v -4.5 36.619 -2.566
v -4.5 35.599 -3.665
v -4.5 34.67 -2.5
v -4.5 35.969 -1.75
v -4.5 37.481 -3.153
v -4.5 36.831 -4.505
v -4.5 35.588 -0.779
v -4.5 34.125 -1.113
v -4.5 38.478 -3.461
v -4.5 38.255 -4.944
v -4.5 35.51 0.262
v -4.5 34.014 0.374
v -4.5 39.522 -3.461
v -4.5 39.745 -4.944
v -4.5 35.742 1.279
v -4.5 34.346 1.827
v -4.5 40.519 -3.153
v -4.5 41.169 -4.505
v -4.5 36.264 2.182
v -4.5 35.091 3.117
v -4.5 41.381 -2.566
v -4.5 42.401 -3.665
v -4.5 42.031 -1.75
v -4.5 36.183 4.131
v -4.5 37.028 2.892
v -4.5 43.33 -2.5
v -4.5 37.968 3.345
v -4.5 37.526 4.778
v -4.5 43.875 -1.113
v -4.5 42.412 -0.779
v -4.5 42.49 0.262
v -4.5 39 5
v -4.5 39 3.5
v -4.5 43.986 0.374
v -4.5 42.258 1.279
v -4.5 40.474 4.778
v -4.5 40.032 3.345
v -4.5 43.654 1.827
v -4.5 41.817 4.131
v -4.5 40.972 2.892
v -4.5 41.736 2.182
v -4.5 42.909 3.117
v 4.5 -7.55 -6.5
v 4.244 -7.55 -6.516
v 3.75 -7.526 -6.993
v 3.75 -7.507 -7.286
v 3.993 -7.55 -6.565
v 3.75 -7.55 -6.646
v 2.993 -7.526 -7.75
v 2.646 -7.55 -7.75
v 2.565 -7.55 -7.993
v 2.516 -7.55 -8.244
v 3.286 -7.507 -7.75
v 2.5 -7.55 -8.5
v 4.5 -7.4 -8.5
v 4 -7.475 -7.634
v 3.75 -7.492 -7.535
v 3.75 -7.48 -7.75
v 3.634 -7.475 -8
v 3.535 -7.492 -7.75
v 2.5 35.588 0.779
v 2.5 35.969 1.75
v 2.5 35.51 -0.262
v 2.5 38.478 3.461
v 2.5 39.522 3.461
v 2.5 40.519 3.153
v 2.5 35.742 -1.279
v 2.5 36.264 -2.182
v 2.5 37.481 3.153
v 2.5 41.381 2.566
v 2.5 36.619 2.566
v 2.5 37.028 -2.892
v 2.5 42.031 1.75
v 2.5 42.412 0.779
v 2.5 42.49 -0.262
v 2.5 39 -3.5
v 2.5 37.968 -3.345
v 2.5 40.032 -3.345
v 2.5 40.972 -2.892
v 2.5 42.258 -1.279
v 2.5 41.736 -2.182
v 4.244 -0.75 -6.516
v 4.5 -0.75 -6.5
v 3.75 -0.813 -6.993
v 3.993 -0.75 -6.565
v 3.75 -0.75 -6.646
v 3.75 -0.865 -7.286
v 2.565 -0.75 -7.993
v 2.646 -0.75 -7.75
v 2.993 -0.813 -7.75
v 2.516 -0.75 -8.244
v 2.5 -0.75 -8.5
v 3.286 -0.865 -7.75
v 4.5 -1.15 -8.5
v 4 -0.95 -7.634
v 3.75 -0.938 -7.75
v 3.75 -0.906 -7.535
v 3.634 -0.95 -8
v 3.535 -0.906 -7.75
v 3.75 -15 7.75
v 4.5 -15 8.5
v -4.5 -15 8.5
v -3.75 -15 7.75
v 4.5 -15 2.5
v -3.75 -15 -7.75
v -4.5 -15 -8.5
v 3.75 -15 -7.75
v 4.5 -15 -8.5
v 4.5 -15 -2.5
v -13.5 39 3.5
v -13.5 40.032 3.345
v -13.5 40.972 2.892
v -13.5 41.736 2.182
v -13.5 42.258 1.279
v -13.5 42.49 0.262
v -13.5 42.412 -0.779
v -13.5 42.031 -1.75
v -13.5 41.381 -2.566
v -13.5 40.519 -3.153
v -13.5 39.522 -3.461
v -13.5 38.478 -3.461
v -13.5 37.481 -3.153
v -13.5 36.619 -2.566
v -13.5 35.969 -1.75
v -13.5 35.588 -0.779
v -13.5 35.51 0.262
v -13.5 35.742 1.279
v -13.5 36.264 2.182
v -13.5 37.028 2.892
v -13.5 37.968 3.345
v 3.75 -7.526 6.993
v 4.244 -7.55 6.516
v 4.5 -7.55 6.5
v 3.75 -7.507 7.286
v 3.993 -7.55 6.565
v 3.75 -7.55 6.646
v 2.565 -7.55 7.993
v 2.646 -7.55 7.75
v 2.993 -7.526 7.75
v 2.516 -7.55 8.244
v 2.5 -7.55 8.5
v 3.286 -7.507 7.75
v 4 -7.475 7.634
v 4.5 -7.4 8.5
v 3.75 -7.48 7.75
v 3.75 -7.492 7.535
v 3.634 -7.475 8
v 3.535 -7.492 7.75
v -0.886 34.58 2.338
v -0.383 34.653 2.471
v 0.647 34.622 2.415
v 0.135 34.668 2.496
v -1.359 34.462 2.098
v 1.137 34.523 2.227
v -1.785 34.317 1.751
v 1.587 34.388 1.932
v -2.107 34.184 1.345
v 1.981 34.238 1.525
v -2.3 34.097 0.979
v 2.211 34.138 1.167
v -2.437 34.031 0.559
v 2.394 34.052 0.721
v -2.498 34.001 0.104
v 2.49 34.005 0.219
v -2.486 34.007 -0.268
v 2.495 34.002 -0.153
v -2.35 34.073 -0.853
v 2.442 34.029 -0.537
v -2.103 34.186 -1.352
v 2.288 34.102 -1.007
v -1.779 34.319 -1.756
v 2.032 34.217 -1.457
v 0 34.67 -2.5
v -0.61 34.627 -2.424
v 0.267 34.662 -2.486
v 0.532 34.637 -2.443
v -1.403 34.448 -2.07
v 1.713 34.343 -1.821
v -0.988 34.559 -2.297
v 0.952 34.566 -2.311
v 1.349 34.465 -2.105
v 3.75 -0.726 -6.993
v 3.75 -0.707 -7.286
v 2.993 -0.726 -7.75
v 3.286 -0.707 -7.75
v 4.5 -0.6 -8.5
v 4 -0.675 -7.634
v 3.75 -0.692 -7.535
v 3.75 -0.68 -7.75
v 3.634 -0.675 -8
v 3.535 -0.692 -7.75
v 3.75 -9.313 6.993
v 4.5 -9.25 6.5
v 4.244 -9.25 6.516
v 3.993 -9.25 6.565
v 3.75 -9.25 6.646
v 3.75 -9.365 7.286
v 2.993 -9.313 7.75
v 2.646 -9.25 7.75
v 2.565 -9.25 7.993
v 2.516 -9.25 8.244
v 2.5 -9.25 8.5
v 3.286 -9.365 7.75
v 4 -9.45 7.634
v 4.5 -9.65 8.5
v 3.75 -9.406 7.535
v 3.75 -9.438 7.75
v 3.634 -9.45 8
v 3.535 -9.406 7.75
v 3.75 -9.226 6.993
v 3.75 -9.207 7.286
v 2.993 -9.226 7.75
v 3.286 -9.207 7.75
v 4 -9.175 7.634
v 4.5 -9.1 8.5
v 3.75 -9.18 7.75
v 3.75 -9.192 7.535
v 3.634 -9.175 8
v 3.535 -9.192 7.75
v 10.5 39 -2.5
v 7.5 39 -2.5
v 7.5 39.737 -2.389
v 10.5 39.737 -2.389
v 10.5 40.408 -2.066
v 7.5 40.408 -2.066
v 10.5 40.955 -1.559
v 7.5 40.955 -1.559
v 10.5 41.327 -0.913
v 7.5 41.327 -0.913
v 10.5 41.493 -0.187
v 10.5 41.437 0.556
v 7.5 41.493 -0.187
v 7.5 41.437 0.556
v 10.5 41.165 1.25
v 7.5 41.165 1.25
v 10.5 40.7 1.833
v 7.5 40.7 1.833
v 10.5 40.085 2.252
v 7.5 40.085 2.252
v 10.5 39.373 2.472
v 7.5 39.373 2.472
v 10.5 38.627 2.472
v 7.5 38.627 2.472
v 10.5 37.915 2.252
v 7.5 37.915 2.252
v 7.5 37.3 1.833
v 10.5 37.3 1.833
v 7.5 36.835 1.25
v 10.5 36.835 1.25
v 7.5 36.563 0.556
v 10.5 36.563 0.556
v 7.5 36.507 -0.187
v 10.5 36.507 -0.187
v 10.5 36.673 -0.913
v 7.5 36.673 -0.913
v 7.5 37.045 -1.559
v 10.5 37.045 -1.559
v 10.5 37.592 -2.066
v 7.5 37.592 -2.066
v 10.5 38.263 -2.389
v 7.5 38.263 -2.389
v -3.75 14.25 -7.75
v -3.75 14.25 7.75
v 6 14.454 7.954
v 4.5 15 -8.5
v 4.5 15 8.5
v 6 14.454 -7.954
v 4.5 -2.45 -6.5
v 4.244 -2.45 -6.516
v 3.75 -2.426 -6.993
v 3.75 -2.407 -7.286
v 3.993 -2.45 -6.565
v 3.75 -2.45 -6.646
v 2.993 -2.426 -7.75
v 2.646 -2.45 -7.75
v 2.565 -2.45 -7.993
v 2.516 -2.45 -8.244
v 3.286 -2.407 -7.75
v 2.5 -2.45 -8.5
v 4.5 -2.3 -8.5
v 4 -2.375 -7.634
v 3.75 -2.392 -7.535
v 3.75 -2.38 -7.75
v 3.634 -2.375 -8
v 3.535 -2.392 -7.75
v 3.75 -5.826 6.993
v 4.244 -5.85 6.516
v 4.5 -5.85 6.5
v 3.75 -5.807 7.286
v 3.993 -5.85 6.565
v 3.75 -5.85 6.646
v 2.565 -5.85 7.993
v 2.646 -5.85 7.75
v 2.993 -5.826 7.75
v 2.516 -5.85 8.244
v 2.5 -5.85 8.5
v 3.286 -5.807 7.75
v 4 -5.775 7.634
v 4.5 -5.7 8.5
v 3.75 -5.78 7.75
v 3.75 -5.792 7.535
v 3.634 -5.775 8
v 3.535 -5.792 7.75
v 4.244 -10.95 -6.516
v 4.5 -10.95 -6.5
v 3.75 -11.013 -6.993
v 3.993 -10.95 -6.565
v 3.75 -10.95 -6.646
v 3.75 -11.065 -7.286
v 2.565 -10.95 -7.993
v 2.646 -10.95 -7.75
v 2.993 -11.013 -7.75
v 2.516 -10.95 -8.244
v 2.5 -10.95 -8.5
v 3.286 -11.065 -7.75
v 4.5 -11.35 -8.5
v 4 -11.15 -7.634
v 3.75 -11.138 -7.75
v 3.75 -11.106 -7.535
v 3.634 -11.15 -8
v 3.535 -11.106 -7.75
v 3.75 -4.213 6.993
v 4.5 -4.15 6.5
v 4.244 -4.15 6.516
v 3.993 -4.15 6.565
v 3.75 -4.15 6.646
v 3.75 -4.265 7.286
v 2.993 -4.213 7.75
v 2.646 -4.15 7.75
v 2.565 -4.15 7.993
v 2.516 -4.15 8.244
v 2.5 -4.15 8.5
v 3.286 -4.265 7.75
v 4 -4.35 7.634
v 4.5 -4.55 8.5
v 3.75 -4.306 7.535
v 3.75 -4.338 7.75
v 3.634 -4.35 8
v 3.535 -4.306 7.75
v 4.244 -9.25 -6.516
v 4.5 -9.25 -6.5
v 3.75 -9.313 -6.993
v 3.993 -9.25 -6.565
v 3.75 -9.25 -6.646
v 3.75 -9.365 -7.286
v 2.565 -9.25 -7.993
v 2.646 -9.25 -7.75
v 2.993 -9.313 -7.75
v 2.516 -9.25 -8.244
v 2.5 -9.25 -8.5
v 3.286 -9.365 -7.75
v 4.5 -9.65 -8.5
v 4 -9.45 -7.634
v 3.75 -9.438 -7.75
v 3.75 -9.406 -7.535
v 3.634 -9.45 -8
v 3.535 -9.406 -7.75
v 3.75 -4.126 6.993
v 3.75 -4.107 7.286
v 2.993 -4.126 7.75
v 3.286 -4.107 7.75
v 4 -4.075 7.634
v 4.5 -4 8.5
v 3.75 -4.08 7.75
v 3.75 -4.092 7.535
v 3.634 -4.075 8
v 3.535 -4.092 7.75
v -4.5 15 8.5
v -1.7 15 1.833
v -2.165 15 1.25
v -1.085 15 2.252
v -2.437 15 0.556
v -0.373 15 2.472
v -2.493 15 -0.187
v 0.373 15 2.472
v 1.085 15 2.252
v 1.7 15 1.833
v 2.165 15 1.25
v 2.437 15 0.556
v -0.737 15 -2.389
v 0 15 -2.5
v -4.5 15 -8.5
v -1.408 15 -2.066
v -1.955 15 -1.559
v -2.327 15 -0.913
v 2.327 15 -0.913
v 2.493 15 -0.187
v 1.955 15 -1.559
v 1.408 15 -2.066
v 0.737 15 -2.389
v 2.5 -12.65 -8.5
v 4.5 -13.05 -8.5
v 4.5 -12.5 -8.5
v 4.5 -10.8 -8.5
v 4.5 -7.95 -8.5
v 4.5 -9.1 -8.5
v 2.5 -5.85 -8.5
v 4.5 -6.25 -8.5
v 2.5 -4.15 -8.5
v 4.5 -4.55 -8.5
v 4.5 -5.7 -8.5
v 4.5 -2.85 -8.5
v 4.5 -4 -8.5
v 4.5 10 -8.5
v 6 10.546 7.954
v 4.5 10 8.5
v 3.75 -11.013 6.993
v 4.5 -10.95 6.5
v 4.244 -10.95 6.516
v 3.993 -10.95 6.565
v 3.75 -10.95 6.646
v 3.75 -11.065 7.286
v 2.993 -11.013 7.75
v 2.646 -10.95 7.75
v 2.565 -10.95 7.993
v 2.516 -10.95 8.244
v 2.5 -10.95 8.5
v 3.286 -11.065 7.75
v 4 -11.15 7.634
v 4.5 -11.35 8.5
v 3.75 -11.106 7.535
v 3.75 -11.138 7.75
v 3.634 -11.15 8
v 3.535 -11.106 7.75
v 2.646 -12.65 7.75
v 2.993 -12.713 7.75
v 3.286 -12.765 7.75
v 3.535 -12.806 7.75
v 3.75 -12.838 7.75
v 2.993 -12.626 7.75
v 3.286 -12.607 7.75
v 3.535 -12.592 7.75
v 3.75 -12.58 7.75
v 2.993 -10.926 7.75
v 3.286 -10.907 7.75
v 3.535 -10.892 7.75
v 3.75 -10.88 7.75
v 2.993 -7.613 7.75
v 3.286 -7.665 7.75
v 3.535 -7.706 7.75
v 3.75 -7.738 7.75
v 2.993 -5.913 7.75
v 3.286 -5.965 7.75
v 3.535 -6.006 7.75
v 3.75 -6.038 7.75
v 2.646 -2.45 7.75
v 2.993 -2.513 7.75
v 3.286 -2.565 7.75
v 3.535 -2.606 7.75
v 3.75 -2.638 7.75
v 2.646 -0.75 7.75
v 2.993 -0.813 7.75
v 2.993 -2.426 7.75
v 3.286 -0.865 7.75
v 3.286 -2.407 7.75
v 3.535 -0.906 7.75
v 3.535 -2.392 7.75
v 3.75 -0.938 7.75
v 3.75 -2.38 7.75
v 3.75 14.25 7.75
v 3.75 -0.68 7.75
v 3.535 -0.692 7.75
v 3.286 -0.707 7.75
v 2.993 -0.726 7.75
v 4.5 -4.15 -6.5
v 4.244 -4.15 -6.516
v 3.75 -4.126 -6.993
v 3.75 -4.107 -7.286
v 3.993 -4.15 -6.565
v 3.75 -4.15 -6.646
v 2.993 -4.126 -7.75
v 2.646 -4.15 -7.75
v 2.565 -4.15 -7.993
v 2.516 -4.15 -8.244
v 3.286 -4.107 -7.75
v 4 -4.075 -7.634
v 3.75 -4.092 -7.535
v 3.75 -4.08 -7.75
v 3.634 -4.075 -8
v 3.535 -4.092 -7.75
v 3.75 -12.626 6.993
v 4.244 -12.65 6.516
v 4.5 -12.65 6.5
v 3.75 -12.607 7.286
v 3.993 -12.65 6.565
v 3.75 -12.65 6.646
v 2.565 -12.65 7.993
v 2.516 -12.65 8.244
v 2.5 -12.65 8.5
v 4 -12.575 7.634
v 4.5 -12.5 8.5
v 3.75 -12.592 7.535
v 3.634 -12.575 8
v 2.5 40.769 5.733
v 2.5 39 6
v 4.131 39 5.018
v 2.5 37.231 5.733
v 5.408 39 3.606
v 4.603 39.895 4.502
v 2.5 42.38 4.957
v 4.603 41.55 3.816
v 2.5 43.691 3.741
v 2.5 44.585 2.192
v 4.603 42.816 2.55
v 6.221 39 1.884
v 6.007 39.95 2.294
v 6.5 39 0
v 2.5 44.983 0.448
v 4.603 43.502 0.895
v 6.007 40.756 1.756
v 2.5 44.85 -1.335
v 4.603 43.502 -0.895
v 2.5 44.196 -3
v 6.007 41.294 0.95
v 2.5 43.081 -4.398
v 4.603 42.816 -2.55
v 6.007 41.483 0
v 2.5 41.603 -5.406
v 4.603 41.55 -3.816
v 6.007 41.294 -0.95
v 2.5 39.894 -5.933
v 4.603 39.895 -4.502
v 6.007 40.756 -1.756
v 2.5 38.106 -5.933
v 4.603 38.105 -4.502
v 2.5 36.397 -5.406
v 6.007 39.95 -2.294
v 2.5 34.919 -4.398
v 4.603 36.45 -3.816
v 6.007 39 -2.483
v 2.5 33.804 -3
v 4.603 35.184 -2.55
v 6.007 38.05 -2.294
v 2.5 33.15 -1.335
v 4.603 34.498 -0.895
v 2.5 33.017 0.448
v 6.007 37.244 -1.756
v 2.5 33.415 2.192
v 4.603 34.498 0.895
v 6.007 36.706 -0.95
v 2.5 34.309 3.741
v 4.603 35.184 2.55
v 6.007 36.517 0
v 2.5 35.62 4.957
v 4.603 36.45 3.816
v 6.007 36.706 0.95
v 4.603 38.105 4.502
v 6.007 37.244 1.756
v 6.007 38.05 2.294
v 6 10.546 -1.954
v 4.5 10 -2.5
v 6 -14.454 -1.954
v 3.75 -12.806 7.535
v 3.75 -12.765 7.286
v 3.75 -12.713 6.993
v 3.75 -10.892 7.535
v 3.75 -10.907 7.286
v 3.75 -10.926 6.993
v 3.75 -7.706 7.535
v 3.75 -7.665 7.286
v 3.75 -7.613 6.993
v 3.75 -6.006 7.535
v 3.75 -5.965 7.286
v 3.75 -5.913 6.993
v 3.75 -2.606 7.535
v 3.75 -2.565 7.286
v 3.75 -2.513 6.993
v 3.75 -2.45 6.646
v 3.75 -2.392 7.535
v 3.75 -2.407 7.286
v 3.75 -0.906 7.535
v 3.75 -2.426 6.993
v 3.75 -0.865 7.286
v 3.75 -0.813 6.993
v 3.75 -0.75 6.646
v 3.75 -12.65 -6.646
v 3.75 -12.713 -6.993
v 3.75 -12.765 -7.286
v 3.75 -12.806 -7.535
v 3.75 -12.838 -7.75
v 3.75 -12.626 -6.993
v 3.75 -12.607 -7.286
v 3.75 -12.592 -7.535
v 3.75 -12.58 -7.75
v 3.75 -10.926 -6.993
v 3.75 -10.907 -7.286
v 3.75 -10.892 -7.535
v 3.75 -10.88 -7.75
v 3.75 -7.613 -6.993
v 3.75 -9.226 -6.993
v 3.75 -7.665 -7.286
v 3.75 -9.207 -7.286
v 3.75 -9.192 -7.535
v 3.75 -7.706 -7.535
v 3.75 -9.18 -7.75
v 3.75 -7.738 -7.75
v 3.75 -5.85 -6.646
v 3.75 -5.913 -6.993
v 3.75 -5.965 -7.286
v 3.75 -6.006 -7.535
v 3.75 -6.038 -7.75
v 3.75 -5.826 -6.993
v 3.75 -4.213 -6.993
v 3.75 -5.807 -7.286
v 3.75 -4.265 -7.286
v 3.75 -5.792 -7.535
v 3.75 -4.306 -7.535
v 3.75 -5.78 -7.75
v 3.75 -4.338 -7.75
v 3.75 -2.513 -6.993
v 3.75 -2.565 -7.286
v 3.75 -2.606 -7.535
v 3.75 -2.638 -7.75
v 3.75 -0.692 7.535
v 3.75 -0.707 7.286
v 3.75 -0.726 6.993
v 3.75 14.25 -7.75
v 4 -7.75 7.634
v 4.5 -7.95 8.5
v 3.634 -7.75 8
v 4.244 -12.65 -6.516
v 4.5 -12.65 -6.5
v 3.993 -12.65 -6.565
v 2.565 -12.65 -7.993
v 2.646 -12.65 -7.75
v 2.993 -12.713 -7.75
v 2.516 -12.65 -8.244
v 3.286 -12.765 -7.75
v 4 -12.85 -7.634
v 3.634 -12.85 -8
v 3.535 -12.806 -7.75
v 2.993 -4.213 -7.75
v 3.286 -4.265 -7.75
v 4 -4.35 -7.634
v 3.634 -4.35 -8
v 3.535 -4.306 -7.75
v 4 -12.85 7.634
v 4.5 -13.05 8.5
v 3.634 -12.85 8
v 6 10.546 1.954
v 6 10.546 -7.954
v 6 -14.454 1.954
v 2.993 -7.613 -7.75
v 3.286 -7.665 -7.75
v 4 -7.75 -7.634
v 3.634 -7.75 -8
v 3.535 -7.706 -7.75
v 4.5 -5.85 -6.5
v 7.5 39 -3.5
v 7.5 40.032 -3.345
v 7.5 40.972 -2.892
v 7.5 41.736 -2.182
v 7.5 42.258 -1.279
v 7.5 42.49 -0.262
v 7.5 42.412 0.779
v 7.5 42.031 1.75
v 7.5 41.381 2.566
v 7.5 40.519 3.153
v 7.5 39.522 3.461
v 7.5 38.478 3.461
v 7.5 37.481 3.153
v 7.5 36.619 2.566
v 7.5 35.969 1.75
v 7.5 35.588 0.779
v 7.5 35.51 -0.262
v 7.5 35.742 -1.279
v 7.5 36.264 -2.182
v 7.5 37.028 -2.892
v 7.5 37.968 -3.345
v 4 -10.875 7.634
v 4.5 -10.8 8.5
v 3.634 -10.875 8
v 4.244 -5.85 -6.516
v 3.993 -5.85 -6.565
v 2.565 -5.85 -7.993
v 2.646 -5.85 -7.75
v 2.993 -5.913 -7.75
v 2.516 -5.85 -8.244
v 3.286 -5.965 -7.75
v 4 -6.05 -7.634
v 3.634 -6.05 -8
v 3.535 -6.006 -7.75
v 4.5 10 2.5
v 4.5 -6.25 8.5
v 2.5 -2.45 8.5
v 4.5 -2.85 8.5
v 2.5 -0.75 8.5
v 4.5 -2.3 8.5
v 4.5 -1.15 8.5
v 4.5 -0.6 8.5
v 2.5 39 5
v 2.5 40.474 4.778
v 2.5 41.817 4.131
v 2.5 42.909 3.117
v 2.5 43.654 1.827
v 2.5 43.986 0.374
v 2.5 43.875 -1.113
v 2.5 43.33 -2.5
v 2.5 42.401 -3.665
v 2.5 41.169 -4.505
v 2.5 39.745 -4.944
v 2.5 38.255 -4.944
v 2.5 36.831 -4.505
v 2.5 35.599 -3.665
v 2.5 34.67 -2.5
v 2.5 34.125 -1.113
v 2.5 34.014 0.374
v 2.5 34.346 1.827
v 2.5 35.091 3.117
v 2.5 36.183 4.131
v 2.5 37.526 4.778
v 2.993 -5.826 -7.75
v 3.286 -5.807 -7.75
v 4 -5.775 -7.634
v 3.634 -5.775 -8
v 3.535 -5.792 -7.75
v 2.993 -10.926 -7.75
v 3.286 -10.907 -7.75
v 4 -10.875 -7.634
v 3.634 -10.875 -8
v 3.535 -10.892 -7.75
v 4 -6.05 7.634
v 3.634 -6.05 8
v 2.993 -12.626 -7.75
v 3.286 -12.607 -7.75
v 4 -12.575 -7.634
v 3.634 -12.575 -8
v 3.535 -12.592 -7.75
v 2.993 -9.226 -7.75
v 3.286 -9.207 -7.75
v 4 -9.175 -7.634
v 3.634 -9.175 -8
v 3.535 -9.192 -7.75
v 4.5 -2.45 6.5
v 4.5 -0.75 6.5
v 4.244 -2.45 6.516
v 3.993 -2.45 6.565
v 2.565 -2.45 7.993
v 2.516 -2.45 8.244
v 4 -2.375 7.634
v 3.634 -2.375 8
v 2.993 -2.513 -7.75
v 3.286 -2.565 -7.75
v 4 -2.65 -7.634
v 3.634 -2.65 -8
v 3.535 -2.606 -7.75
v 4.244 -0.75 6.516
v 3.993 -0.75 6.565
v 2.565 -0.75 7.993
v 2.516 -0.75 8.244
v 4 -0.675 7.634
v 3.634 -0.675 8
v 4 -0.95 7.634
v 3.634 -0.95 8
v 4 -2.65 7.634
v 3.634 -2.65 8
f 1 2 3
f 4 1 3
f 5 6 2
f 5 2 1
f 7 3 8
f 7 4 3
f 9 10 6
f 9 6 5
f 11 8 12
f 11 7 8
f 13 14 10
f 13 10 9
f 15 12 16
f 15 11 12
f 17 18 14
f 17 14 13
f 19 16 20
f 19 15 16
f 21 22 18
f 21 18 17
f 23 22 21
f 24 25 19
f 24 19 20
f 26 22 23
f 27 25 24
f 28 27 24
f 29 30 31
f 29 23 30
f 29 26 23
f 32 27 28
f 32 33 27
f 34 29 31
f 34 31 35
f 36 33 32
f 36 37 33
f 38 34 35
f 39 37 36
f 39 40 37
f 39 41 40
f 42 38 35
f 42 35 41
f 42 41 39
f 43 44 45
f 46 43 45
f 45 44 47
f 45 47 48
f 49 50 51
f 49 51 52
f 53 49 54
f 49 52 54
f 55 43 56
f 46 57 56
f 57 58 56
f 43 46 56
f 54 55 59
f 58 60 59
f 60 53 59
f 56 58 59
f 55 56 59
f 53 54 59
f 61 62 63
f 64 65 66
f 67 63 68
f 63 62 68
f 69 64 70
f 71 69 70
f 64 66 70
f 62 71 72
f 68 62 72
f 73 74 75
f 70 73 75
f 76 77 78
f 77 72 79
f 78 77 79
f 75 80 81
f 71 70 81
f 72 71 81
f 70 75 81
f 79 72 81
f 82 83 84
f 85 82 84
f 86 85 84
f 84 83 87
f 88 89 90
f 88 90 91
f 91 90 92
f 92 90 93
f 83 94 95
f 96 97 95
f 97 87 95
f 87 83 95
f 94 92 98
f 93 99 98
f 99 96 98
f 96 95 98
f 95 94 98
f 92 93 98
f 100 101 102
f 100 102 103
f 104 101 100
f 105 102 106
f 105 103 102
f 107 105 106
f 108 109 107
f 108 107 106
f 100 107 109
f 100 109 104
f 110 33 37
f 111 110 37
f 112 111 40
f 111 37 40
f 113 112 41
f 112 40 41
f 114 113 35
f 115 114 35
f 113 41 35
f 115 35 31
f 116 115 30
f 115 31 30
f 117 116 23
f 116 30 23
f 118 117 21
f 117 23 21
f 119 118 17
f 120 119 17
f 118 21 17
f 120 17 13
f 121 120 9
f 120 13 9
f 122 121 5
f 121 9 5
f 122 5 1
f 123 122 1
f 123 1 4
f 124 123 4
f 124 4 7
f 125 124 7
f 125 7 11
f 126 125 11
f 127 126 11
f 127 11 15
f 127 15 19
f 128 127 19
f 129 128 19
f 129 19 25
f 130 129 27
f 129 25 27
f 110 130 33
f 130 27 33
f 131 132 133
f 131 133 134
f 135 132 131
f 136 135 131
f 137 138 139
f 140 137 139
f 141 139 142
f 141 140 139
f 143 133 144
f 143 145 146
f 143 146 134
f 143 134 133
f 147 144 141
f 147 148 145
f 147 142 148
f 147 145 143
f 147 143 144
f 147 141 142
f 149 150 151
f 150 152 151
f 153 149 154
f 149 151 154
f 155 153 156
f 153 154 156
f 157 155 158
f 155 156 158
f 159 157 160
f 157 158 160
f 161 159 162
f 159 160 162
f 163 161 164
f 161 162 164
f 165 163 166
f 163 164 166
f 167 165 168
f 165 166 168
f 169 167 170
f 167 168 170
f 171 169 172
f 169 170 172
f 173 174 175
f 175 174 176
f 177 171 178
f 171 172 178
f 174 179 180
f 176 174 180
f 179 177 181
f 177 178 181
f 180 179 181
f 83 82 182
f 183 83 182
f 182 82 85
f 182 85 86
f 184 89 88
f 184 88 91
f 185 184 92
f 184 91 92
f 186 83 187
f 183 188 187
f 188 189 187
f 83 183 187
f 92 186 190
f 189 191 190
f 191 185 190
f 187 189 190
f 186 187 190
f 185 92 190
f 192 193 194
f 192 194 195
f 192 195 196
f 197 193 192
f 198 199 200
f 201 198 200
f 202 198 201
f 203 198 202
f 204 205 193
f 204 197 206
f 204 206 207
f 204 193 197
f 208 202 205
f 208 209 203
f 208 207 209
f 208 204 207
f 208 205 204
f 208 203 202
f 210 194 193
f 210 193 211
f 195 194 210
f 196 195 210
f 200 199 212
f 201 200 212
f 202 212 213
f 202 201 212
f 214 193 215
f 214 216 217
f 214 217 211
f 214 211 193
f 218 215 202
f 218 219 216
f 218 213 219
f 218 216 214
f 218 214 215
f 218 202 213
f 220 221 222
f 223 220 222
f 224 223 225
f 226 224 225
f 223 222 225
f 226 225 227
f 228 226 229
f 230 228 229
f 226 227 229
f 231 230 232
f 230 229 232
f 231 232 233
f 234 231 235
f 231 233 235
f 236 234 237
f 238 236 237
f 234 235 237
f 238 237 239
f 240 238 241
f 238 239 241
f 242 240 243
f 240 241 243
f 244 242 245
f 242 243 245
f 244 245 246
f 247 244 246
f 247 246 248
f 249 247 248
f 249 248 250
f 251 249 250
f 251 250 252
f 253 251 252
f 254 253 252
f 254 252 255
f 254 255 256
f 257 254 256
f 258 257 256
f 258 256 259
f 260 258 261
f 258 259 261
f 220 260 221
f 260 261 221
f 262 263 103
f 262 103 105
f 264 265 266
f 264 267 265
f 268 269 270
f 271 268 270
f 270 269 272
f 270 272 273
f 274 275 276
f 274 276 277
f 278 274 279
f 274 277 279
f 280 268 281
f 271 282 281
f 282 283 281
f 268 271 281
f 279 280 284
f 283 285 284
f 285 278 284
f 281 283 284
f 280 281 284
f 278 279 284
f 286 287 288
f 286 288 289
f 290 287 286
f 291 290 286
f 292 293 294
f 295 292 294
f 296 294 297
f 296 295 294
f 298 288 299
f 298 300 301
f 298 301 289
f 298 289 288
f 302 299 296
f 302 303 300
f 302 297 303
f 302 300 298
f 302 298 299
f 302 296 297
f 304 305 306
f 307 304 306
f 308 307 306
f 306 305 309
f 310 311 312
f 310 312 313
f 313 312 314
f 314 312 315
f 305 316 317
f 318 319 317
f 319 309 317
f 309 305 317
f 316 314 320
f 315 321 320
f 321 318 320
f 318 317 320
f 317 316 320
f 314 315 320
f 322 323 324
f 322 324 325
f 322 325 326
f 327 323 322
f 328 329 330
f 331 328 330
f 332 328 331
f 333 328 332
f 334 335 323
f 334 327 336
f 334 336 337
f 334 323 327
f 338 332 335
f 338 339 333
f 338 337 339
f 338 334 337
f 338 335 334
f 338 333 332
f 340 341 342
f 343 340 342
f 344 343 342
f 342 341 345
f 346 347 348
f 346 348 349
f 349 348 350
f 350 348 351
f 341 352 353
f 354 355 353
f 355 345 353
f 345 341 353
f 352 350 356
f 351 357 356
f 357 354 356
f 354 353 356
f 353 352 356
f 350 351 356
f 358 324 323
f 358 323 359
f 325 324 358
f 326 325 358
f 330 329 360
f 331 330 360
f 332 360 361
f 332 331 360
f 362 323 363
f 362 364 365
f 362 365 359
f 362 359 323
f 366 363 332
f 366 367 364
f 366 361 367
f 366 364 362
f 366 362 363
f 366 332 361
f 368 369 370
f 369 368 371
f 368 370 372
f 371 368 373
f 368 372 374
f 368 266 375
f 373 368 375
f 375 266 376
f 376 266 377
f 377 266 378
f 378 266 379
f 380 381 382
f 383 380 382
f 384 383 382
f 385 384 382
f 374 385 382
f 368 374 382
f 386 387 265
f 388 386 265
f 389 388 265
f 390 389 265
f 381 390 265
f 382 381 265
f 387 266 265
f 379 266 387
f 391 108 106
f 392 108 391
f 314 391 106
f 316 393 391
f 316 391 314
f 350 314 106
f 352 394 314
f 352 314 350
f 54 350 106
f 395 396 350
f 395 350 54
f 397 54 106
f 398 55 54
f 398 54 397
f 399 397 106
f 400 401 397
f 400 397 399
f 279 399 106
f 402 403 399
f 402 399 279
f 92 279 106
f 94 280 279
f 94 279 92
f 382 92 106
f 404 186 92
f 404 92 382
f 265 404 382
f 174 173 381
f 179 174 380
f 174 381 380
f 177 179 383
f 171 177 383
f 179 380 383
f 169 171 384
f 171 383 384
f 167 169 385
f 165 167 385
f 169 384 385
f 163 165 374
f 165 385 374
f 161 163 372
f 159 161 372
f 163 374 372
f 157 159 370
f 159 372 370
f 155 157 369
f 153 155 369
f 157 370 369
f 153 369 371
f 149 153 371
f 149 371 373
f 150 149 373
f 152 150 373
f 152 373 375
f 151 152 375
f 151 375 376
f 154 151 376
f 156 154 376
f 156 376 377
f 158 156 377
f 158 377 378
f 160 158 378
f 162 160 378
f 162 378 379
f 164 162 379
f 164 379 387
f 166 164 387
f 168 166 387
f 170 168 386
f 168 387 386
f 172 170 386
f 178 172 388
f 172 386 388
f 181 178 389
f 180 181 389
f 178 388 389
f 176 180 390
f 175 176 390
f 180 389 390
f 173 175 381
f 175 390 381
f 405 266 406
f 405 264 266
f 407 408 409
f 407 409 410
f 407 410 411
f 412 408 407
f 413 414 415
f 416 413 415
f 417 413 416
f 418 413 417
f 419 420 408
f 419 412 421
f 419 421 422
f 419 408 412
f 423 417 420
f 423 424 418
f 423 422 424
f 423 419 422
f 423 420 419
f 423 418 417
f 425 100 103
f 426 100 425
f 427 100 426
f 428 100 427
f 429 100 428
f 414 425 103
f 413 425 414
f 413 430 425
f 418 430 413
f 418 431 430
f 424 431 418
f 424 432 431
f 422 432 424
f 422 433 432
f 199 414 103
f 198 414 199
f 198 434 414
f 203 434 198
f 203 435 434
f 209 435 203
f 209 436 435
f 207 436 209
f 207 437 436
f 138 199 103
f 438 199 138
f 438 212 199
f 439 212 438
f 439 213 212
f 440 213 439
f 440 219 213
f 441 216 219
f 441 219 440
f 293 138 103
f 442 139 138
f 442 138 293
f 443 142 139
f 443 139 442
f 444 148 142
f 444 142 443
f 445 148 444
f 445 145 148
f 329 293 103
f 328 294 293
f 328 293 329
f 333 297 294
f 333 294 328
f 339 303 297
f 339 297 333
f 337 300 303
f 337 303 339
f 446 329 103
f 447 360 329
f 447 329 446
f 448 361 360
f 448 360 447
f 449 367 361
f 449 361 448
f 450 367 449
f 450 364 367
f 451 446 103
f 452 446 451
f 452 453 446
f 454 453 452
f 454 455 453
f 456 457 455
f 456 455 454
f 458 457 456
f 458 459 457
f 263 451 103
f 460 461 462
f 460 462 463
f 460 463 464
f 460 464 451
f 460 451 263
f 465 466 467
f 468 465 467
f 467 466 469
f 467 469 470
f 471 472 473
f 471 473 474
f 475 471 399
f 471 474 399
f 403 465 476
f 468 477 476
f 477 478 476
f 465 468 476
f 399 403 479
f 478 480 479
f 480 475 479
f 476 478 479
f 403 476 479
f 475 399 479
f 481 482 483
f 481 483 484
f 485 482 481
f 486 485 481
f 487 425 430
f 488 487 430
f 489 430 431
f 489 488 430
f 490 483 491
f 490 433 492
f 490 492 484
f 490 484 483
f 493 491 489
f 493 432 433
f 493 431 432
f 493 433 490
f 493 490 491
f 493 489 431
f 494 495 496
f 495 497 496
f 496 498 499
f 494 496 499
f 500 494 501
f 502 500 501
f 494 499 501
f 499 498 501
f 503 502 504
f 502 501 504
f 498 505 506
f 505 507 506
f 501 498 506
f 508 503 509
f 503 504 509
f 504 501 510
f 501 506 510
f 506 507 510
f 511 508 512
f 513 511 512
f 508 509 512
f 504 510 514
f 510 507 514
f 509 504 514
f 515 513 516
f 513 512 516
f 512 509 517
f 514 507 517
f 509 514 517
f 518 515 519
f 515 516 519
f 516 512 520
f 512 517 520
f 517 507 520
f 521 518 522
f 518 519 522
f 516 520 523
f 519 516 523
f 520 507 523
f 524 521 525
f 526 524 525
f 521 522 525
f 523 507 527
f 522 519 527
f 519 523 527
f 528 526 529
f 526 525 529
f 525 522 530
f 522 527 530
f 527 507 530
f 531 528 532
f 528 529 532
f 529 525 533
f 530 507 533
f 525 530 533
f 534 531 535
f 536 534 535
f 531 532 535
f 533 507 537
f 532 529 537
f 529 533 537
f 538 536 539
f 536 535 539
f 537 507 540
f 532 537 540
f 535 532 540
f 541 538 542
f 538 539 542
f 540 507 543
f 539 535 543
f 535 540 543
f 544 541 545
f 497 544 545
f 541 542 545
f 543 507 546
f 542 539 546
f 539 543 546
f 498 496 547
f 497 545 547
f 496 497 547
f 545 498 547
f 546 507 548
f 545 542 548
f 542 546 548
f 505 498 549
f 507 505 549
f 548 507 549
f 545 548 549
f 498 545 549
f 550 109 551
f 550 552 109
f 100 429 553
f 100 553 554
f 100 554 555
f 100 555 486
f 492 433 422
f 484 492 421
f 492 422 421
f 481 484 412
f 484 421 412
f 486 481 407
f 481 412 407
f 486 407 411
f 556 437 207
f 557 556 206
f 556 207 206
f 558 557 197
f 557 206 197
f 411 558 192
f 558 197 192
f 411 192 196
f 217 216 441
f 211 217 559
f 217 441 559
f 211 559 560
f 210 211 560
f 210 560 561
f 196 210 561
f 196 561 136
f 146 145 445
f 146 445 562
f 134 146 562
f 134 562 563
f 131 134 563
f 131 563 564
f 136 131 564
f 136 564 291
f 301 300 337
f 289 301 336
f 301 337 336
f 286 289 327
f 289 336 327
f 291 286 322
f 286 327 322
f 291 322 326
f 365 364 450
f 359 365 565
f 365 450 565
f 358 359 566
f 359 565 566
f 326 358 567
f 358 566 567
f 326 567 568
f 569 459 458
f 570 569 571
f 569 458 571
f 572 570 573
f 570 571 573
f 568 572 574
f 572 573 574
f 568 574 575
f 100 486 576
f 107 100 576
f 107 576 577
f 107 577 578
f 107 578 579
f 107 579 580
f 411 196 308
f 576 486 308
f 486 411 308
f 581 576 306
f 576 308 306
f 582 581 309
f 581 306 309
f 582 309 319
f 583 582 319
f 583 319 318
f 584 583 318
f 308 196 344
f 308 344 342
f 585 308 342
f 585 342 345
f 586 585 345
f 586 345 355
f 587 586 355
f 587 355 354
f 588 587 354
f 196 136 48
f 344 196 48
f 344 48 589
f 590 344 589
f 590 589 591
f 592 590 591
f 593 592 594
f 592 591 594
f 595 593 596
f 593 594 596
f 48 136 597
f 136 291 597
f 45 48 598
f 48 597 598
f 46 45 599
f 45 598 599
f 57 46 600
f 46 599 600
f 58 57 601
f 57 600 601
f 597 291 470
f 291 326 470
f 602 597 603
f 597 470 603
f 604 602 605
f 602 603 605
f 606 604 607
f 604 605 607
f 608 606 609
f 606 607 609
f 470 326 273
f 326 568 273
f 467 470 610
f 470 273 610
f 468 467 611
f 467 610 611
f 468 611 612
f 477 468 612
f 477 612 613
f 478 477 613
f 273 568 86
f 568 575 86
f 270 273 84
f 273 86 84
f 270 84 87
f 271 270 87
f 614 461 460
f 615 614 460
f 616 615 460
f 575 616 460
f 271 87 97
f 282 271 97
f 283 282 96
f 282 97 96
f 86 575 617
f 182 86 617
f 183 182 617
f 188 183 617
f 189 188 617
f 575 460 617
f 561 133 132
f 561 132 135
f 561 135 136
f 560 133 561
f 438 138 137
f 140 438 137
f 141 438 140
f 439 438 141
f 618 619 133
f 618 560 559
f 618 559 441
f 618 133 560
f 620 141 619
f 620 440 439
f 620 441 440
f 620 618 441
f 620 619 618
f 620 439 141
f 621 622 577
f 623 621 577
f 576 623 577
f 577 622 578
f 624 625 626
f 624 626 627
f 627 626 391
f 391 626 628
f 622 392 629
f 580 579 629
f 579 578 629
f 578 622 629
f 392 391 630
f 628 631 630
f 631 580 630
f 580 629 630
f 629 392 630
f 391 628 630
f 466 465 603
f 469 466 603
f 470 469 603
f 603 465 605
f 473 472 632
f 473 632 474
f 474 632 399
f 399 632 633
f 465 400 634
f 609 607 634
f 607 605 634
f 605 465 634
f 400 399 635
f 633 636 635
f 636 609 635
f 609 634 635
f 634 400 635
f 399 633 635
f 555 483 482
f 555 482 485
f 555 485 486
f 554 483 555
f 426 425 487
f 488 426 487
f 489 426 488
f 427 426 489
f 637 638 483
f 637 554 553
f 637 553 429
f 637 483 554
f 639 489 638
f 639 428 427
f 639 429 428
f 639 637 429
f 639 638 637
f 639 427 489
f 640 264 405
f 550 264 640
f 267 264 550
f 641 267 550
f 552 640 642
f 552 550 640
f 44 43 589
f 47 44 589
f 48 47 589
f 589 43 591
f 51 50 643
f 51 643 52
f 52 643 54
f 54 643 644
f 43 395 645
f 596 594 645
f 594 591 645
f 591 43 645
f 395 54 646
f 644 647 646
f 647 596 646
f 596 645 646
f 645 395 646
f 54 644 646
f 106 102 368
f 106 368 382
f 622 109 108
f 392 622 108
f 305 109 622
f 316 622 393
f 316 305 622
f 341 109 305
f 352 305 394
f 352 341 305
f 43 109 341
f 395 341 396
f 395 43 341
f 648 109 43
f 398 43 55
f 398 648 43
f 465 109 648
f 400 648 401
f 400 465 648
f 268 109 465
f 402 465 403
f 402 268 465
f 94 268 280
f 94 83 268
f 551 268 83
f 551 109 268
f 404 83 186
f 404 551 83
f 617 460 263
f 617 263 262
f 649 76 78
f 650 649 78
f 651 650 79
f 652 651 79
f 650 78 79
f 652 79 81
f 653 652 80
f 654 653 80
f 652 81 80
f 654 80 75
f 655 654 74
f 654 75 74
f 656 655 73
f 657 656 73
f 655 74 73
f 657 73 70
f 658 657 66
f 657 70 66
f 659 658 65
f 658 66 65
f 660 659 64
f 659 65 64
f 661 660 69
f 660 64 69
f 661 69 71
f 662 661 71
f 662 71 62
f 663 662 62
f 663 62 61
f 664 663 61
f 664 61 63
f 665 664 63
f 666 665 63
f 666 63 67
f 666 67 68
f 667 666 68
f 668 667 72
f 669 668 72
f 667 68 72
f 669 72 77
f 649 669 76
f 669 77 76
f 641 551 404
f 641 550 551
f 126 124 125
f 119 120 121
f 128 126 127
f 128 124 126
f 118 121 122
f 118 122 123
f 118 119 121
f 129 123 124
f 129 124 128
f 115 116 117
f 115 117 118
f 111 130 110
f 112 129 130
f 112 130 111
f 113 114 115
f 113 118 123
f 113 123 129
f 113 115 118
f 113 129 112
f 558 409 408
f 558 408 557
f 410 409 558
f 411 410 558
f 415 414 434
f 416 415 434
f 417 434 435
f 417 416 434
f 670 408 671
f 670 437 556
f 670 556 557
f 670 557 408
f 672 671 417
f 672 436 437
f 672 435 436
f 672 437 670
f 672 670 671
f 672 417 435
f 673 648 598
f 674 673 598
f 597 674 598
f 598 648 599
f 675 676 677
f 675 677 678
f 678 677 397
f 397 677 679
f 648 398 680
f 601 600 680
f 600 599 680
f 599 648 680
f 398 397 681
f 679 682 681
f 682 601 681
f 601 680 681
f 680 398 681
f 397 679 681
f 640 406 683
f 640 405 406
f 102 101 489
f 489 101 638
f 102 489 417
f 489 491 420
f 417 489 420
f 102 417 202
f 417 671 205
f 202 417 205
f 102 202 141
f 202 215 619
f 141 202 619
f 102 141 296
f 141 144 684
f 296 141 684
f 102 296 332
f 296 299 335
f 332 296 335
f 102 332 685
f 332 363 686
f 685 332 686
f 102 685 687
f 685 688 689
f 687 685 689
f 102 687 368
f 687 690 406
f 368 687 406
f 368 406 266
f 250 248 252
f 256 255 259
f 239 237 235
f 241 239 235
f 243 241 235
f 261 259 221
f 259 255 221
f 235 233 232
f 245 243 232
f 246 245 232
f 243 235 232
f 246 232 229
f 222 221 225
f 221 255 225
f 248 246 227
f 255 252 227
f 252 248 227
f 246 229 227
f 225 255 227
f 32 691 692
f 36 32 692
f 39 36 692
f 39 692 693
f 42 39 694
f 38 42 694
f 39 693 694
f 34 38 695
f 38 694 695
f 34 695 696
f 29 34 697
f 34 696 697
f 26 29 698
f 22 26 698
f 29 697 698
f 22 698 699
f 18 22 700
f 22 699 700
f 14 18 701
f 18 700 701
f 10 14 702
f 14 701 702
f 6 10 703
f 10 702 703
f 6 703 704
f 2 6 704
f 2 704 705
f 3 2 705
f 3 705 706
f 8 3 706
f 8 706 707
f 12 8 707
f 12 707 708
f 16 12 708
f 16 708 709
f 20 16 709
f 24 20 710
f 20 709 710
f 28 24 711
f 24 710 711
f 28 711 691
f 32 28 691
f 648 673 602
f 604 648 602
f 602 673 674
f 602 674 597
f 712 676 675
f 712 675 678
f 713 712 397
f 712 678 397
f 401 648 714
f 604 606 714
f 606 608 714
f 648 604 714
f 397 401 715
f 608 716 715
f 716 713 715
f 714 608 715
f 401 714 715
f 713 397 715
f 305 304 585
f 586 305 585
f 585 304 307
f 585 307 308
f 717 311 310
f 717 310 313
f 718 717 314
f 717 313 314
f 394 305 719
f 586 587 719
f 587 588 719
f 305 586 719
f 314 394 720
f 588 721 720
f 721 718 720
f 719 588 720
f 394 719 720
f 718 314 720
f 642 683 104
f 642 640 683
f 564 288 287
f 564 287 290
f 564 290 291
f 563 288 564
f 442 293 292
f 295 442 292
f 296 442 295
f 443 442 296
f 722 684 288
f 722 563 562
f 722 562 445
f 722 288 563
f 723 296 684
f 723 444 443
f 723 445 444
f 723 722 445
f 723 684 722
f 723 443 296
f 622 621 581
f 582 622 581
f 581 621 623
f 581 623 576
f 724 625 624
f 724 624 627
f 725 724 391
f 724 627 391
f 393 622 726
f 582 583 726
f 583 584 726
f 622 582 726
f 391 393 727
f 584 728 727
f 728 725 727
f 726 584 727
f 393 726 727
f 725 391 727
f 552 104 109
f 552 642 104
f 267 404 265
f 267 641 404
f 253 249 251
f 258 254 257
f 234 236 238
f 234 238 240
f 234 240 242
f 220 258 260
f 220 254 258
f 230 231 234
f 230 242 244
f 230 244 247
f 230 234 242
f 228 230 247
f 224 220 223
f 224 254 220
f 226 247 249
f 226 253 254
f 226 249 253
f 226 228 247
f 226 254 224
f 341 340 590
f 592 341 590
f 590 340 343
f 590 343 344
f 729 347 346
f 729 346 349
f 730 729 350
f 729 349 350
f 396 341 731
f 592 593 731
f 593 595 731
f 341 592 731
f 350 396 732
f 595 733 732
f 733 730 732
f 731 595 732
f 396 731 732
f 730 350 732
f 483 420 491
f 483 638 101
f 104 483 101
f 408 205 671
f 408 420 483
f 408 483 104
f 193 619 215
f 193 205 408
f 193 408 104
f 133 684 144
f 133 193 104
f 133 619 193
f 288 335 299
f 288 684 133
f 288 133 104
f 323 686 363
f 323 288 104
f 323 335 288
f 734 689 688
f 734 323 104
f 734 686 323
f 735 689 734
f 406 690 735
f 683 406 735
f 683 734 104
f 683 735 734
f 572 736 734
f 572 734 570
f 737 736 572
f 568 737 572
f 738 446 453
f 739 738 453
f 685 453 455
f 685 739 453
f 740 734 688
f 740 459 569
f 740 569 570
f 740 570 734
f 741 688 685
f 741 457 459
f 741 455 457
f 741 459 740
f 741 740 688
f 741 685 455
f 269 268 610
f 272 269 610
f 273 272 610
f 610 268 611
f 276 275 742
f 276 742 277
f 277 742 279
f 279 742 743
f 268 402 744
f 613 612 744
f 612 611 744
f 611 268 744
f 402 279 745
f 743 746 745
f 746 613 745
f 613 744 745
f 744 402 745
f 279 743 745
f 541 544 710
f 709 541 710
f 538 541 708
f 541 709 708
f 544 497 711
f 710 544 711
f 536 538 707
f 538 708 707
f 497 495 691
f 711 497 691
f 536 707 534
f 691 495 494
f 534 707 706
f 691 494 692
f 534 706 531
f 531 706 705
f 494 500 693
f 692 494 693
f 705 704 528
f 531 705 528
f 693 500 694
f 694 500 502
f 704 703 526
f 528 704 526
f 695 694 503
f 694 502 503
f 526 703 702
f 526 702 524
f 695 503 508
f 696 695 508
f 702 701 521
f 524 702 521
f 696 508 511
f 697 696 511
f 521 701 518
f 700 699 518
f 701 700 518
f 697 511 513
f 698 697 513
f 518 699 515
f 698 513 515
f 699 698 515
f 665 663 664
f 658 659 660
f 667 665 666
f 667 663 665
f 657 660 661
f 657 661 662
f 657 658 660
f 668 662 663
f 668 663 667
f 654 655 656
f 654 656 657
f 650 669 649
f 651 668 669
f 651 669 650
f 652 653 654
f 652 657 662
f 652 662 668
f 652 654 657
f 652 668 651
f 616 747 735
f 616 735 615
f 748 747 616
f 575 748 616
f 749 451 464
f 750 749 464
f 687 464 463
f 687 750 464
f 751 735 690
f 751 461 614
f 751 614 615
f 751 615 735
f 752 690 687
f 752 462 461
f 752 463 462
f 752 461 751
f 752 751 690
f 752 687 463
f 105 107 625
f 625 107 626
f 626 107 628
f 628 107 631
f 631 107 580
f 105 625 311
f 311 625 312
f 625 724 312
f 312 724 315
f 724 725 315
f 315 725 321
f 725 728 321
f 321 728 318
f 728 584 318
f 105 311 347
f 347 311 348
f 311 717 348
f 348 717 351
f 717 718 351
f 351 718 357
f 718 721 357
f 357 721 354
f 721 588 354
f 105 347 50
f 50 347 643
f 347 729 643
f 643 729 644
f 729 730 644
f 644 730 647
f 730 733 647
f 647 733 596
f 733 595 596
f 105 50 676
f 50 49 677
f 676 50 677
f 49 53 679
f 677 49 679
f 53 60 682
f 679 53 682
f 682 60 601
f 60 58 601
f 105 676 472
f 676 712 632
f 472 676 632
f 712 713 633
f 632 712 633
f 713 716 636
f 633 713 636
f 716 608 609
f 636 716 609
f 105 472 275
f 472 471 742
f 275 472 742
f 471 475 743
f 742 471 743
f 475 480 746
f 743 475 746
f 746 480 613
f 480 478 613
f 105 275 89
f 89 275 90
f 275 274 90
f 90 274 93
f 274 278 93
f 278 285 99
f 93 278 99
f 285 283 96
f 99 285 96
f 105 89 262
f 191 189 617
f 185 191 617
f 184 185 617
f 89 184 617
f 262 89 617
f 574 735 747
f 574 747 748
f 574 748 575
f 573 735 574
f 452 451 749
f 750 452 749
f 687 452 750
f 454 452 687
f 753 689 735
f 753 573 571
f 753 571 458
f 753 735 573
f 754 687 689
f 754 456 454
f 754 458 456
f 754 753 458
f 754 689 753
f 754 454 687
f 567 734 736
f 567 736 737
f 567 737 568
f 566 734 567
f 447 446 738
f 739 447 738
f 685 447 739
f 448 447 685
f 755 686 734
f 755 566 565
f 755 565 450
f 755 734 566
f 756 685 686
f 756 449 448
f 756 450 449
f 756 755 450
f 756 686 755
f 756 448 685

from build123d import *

# Parameters (mm, degrees)
SKETCH2_W                = 17
SKETCH2_H                = 30
BOSS_EXTRUDE1_DEPTH      = 4.5
SHELL1_T                 = -0.75
LPATTERN1_COUNT          = 8
LPATTERN1_PITCH          = 1.7
SKETCH7_R                = 5
BOSS_EXTRUDE3_DEPTH      = 7
BOSS_EXTRUDE2_REACH      = 33.851
BOSS_EXTRUDE2_END_RADIUS = 5
SKETCH3_R                = 2.5
SKETCH8_R                = 3.5
BOSS_EXTRUDE4_DEPTH      = 9
SKETCH9_R                = 3.5
BOSS_EXTRUDE5_DEPTH      = 5
SKETCH11_R               = 2.5
BOSS_EXTRUDE6_DEPTH      = 3
BOSS_EXTRUDE7_DEPTH      = 1.5
BOSS_EXTRUDE7_TAPER      = 20


with BuildPart() as part:
    # Sketch2 → Boss-Extrude1 (new, symmetric)
    with BuildSketch(Plane(origin=(0, 0, 0), x_dir=(0, 0, -1), z_dir=(1, 0, 0))):
        Rectangle(SKETCH2_W, SKETCH2_H)
    extrude(amount=BOSS_EXTRUDE1_DEPTH, both=True)

    # Shell1
    shell1_openings = [part.faces().sort_by_distance(p)[0] for p in [
        (0, -15, 0),
    ]]
    offset(amount=SHELL1_T, openings=shell1_openings, kind=Kind.INTERSECTION)

    # Sketch12 → Cut-Revolve1 (revolve, cut)
    with BuildSketch(Plane.XY.offset(8.5)):
        Polygon((4.5, -12.5), (2.5, -12.65), (4.5, -13.05), align=None)
    cut_revolve1 = revolve(axis=Axis((4.5, -15, 8.5), (0, 1, 0)), mode=Mode.SUBTRACT)

    # LPattern1: Cut-Revolve1 ×8
    with Locations(*[(0, i * LPATTERN1_PITCH, 0) for i in range(1, LPATTERN1_COUNT)]):
        add(cut_revolve1, mode=Mode.SUBTRACT)

    # Boss-Extrude2: up to this cylinder (the profile starts outside it)
    boss_extrude2_end = Plane(origin=(0, 39, 0), z_dir=(1, 0, 0)) * Cylinder(BOSS_EXTRUDE2_END_RADIUS, 78.702, mode=Mode.PRIVATE)
    # Sketch3 → Boss-Extrude2 (add, up to the surface)
    with BuildSketch(Plane(origin=(0, 15, 0), x_dir=(1, 0, 0), z_dir=(0, 1, 0)), mode=Mode.PRIVATE) as boss_extrude2_sk1:
        with Locations(Location((0, 0, 0), (0, 0, 90))):
            Circle(SKETCH3_R)
    boss_extrude2_tool1 = extrude(boss_extrude2_sk1.sketch, amount=BOSS_EXTRUDE2_REACH, mode=Mode.PRIVATE) - boss_extrude2_end
    add(boss_extrude2_tool1.solids().sort_by_distance((0, 15, 0))[0])

    # Sketch13 → Boss-Extrude7 (add)
    with BuildSketch(Plane(origin=(4.5, 0, 0), x_dir=(0, 0, -1), z_dir=(1, 0, 0))):
        Polygon((-8.5, 15), (-8.5, 10), (-2.5, 10), (-2.5, -15), (2.5, -15), (2.5, 10), (8.5, 10), (8.5, 15), align=None)
    extrude(amount=BOSS_EXTRUDE7_DEPTH, taper=BOSS_EXTRUDE7_TAPER)

    # Mirror1: Cut-Revolve1 across plane
    add(cut_revolve1.mirror(Plane.XY), mode=Mode.SUBTRACT)

    # Mirror1 copy 1 sketch → Mirror1 copy 1 (revolve, cut)
    with BuildSketch(Plane(origin=(0, 1.7, -8.5), x_dir=(1, 0, 0), z_dir=(0, 0, -1))):
        Polygon((4.5, 12.5), (2.5, 12.65), (4.5, 13.05), align=None)
    revolve(axis=Axis((4.5, -13.3, -8.5), (0, -1, 0)), mode=Mode.SUBTRACT)

    # Mirror1 copy 2 sketch → Mirror1 copy 2 (revolve, cut)
    with BuildSketch(Plane(origin=(0, 3.4, -8.5), x_dir=(1, 0, 0), z_dir=(0, 0, -1))):
        Polygon((4.5, 12.5), (2.5, 12.65), (4.5, 13.05), align=None)
    revolve(axis=Axis((4.5, -11.6, -8.5), (0, -1, 0)), mode=Mode.SUBTRACT)

    # Mirror1 copy 3 sketch → Mirror1 copy 3 (revolve, cut)
    with BuildSketch(Plane(origin=(0, 5.1, -8.5), x_dir=(1, 0, 0), z_dir=(0, 0, -1))):
        Polygon((4.5, 12.5), (2.5, 12.65), (4.5, 13.05), align=None)
    revolve(axis=Axis((4.5, -9.9, -8.5), (0, -1, 0)), mode=Mode.SUBTRACT)

    # Mirror1 copy 4 sketch → Mirror1 copy 4 (revolve, cut)
    with BuildSketch(Plane(origin=(0, 6.8, -8.5), x_dir=(1, 0, 0), z_dir=(0, 0, -1))):
        Polygon((4.5, 12.5), (2.5, 12.65), (4.5, 13.05), align=None)
    revolve(axis=Axis((4.5, -8.2, -8.5), (0, -1, 0)), mode=Mode.SUBTRACT)

    # Mirror1 copy 5 sketch → Mirror1 copy 5 (revolve, cut)
    with BuildSketch(Plane(origin=(0, 8.5, -8.5), x_dir=(1, 0, 0), z_dir=(0, 0, -1))):
        Polygon((4.5, 12.5), (2.5, 12.65), (4.5, 13.05), align=None)
    revolve(axis=Axis((4.5, -6.5, -8.5), (0, -1, 0)), mode=Mode.SUBTRACT)

    # Mirror1 copy 6 sketch → Mirror1 copy 6 (revolve, cut)
    with BuildSketch(Plane(origin=(0, 10.2, -8.5), x_dir=(1, 0, 0), z_dir=(0, 0, -1))):
        Polygon((4.5, 12.5), (2.5, 12.65), (4.5, 13.05), align=None)
    revolve(axis=Axis((4.5, -4.8, -8.5), (0, -1, 0)), mode=Mode.SUBTRACT)

    # Mirror1 copy 7 sketch → Mirror1 copy 7 (revolve, cut)
    with BuildSketch(Plane(origin=(0, 11.9, -8.5), x_dir=(1, 0, 0), z_dir=(0, 0, -1))):
        Polygon((4.5, 12.5), (2.5, 12.65), (4.5, 13.05), align=None)
    revolve(axis=Axis((4.5, -3.1, -8.5), (0, -1, 0)), mode=Mode.SUBTRACT)


with BuildPart() as body_2:
    # Sketch5 → Revolve1 (revolve)
    with BuildSketch(Plane(origin=(0, 39, 0), x_dir=(1, 0, 0), z_dir=(0, 1, 0)), mode=Mode.PRIVATE) as revolve1_sk:
        with BuildLine():
            Line((2.5, 0), (2.5, 6))
            ThreePointArc((2.5, 6), (5.408326913, 3.605551275), (6.5, 0))
            Line((6.5, 0), (2.5, 0))
        make_face()
    revolve(revolve1_sk.sketch.rotate(Axis((16.74985483, 39, 0), (-1, 0, 0)), 180), axis=Axis((16.74985483, 39, 0), (-1, 0, 0)))

    # Sketch7 → Boss-Extrude3 (add)
    with BuildSketch(Plane.ZY.offset(-2.5)):
        with Locations((0, 39)):
            Circle(SKETCH7_R)
    extrude(amount=BOSS_EXTRUDE3_DEPTH)

    # Sketch8 → Boss-Extrude4 (add)
    with BuildSketch(Plane.ZY.offset(4.5)):
        with Locations((0, 39)):
            Circle(SKETCH8_R)
    extrude(amount=BOSS_EXTRUDE4_DEPTH)


with BuildPart() as body_3:
    # Sketch9 → Boss-Extrude5 (new body)
    with BuildSketch(Plane(origin=(2.5, 0, 0), x_dir=(0, 0, -1), z_dir=(1, 0, 0))):
        with Locations((0, 39)):
            Circle(SKETCH9_R)
    extrude(amount=BOSS_EXTRUDE5_DEPTH)


with BuildPart() as body_4:
    # Sketch11 → Boss-Extrude6 (new body)
    with BuildSketch(Plane(origin=(7.5, 0, 0), x_dir=(0, 0, -1), z_dir=(1, 0, 0))):
        with Locations((0, 39)):
            Circle(SKETCH11_R)
    extrude(amount=BOSS_EXTRUDE6_DEPTH)


solid = Compound([part.part, body_2.part, body_3.part, body_4.part])
